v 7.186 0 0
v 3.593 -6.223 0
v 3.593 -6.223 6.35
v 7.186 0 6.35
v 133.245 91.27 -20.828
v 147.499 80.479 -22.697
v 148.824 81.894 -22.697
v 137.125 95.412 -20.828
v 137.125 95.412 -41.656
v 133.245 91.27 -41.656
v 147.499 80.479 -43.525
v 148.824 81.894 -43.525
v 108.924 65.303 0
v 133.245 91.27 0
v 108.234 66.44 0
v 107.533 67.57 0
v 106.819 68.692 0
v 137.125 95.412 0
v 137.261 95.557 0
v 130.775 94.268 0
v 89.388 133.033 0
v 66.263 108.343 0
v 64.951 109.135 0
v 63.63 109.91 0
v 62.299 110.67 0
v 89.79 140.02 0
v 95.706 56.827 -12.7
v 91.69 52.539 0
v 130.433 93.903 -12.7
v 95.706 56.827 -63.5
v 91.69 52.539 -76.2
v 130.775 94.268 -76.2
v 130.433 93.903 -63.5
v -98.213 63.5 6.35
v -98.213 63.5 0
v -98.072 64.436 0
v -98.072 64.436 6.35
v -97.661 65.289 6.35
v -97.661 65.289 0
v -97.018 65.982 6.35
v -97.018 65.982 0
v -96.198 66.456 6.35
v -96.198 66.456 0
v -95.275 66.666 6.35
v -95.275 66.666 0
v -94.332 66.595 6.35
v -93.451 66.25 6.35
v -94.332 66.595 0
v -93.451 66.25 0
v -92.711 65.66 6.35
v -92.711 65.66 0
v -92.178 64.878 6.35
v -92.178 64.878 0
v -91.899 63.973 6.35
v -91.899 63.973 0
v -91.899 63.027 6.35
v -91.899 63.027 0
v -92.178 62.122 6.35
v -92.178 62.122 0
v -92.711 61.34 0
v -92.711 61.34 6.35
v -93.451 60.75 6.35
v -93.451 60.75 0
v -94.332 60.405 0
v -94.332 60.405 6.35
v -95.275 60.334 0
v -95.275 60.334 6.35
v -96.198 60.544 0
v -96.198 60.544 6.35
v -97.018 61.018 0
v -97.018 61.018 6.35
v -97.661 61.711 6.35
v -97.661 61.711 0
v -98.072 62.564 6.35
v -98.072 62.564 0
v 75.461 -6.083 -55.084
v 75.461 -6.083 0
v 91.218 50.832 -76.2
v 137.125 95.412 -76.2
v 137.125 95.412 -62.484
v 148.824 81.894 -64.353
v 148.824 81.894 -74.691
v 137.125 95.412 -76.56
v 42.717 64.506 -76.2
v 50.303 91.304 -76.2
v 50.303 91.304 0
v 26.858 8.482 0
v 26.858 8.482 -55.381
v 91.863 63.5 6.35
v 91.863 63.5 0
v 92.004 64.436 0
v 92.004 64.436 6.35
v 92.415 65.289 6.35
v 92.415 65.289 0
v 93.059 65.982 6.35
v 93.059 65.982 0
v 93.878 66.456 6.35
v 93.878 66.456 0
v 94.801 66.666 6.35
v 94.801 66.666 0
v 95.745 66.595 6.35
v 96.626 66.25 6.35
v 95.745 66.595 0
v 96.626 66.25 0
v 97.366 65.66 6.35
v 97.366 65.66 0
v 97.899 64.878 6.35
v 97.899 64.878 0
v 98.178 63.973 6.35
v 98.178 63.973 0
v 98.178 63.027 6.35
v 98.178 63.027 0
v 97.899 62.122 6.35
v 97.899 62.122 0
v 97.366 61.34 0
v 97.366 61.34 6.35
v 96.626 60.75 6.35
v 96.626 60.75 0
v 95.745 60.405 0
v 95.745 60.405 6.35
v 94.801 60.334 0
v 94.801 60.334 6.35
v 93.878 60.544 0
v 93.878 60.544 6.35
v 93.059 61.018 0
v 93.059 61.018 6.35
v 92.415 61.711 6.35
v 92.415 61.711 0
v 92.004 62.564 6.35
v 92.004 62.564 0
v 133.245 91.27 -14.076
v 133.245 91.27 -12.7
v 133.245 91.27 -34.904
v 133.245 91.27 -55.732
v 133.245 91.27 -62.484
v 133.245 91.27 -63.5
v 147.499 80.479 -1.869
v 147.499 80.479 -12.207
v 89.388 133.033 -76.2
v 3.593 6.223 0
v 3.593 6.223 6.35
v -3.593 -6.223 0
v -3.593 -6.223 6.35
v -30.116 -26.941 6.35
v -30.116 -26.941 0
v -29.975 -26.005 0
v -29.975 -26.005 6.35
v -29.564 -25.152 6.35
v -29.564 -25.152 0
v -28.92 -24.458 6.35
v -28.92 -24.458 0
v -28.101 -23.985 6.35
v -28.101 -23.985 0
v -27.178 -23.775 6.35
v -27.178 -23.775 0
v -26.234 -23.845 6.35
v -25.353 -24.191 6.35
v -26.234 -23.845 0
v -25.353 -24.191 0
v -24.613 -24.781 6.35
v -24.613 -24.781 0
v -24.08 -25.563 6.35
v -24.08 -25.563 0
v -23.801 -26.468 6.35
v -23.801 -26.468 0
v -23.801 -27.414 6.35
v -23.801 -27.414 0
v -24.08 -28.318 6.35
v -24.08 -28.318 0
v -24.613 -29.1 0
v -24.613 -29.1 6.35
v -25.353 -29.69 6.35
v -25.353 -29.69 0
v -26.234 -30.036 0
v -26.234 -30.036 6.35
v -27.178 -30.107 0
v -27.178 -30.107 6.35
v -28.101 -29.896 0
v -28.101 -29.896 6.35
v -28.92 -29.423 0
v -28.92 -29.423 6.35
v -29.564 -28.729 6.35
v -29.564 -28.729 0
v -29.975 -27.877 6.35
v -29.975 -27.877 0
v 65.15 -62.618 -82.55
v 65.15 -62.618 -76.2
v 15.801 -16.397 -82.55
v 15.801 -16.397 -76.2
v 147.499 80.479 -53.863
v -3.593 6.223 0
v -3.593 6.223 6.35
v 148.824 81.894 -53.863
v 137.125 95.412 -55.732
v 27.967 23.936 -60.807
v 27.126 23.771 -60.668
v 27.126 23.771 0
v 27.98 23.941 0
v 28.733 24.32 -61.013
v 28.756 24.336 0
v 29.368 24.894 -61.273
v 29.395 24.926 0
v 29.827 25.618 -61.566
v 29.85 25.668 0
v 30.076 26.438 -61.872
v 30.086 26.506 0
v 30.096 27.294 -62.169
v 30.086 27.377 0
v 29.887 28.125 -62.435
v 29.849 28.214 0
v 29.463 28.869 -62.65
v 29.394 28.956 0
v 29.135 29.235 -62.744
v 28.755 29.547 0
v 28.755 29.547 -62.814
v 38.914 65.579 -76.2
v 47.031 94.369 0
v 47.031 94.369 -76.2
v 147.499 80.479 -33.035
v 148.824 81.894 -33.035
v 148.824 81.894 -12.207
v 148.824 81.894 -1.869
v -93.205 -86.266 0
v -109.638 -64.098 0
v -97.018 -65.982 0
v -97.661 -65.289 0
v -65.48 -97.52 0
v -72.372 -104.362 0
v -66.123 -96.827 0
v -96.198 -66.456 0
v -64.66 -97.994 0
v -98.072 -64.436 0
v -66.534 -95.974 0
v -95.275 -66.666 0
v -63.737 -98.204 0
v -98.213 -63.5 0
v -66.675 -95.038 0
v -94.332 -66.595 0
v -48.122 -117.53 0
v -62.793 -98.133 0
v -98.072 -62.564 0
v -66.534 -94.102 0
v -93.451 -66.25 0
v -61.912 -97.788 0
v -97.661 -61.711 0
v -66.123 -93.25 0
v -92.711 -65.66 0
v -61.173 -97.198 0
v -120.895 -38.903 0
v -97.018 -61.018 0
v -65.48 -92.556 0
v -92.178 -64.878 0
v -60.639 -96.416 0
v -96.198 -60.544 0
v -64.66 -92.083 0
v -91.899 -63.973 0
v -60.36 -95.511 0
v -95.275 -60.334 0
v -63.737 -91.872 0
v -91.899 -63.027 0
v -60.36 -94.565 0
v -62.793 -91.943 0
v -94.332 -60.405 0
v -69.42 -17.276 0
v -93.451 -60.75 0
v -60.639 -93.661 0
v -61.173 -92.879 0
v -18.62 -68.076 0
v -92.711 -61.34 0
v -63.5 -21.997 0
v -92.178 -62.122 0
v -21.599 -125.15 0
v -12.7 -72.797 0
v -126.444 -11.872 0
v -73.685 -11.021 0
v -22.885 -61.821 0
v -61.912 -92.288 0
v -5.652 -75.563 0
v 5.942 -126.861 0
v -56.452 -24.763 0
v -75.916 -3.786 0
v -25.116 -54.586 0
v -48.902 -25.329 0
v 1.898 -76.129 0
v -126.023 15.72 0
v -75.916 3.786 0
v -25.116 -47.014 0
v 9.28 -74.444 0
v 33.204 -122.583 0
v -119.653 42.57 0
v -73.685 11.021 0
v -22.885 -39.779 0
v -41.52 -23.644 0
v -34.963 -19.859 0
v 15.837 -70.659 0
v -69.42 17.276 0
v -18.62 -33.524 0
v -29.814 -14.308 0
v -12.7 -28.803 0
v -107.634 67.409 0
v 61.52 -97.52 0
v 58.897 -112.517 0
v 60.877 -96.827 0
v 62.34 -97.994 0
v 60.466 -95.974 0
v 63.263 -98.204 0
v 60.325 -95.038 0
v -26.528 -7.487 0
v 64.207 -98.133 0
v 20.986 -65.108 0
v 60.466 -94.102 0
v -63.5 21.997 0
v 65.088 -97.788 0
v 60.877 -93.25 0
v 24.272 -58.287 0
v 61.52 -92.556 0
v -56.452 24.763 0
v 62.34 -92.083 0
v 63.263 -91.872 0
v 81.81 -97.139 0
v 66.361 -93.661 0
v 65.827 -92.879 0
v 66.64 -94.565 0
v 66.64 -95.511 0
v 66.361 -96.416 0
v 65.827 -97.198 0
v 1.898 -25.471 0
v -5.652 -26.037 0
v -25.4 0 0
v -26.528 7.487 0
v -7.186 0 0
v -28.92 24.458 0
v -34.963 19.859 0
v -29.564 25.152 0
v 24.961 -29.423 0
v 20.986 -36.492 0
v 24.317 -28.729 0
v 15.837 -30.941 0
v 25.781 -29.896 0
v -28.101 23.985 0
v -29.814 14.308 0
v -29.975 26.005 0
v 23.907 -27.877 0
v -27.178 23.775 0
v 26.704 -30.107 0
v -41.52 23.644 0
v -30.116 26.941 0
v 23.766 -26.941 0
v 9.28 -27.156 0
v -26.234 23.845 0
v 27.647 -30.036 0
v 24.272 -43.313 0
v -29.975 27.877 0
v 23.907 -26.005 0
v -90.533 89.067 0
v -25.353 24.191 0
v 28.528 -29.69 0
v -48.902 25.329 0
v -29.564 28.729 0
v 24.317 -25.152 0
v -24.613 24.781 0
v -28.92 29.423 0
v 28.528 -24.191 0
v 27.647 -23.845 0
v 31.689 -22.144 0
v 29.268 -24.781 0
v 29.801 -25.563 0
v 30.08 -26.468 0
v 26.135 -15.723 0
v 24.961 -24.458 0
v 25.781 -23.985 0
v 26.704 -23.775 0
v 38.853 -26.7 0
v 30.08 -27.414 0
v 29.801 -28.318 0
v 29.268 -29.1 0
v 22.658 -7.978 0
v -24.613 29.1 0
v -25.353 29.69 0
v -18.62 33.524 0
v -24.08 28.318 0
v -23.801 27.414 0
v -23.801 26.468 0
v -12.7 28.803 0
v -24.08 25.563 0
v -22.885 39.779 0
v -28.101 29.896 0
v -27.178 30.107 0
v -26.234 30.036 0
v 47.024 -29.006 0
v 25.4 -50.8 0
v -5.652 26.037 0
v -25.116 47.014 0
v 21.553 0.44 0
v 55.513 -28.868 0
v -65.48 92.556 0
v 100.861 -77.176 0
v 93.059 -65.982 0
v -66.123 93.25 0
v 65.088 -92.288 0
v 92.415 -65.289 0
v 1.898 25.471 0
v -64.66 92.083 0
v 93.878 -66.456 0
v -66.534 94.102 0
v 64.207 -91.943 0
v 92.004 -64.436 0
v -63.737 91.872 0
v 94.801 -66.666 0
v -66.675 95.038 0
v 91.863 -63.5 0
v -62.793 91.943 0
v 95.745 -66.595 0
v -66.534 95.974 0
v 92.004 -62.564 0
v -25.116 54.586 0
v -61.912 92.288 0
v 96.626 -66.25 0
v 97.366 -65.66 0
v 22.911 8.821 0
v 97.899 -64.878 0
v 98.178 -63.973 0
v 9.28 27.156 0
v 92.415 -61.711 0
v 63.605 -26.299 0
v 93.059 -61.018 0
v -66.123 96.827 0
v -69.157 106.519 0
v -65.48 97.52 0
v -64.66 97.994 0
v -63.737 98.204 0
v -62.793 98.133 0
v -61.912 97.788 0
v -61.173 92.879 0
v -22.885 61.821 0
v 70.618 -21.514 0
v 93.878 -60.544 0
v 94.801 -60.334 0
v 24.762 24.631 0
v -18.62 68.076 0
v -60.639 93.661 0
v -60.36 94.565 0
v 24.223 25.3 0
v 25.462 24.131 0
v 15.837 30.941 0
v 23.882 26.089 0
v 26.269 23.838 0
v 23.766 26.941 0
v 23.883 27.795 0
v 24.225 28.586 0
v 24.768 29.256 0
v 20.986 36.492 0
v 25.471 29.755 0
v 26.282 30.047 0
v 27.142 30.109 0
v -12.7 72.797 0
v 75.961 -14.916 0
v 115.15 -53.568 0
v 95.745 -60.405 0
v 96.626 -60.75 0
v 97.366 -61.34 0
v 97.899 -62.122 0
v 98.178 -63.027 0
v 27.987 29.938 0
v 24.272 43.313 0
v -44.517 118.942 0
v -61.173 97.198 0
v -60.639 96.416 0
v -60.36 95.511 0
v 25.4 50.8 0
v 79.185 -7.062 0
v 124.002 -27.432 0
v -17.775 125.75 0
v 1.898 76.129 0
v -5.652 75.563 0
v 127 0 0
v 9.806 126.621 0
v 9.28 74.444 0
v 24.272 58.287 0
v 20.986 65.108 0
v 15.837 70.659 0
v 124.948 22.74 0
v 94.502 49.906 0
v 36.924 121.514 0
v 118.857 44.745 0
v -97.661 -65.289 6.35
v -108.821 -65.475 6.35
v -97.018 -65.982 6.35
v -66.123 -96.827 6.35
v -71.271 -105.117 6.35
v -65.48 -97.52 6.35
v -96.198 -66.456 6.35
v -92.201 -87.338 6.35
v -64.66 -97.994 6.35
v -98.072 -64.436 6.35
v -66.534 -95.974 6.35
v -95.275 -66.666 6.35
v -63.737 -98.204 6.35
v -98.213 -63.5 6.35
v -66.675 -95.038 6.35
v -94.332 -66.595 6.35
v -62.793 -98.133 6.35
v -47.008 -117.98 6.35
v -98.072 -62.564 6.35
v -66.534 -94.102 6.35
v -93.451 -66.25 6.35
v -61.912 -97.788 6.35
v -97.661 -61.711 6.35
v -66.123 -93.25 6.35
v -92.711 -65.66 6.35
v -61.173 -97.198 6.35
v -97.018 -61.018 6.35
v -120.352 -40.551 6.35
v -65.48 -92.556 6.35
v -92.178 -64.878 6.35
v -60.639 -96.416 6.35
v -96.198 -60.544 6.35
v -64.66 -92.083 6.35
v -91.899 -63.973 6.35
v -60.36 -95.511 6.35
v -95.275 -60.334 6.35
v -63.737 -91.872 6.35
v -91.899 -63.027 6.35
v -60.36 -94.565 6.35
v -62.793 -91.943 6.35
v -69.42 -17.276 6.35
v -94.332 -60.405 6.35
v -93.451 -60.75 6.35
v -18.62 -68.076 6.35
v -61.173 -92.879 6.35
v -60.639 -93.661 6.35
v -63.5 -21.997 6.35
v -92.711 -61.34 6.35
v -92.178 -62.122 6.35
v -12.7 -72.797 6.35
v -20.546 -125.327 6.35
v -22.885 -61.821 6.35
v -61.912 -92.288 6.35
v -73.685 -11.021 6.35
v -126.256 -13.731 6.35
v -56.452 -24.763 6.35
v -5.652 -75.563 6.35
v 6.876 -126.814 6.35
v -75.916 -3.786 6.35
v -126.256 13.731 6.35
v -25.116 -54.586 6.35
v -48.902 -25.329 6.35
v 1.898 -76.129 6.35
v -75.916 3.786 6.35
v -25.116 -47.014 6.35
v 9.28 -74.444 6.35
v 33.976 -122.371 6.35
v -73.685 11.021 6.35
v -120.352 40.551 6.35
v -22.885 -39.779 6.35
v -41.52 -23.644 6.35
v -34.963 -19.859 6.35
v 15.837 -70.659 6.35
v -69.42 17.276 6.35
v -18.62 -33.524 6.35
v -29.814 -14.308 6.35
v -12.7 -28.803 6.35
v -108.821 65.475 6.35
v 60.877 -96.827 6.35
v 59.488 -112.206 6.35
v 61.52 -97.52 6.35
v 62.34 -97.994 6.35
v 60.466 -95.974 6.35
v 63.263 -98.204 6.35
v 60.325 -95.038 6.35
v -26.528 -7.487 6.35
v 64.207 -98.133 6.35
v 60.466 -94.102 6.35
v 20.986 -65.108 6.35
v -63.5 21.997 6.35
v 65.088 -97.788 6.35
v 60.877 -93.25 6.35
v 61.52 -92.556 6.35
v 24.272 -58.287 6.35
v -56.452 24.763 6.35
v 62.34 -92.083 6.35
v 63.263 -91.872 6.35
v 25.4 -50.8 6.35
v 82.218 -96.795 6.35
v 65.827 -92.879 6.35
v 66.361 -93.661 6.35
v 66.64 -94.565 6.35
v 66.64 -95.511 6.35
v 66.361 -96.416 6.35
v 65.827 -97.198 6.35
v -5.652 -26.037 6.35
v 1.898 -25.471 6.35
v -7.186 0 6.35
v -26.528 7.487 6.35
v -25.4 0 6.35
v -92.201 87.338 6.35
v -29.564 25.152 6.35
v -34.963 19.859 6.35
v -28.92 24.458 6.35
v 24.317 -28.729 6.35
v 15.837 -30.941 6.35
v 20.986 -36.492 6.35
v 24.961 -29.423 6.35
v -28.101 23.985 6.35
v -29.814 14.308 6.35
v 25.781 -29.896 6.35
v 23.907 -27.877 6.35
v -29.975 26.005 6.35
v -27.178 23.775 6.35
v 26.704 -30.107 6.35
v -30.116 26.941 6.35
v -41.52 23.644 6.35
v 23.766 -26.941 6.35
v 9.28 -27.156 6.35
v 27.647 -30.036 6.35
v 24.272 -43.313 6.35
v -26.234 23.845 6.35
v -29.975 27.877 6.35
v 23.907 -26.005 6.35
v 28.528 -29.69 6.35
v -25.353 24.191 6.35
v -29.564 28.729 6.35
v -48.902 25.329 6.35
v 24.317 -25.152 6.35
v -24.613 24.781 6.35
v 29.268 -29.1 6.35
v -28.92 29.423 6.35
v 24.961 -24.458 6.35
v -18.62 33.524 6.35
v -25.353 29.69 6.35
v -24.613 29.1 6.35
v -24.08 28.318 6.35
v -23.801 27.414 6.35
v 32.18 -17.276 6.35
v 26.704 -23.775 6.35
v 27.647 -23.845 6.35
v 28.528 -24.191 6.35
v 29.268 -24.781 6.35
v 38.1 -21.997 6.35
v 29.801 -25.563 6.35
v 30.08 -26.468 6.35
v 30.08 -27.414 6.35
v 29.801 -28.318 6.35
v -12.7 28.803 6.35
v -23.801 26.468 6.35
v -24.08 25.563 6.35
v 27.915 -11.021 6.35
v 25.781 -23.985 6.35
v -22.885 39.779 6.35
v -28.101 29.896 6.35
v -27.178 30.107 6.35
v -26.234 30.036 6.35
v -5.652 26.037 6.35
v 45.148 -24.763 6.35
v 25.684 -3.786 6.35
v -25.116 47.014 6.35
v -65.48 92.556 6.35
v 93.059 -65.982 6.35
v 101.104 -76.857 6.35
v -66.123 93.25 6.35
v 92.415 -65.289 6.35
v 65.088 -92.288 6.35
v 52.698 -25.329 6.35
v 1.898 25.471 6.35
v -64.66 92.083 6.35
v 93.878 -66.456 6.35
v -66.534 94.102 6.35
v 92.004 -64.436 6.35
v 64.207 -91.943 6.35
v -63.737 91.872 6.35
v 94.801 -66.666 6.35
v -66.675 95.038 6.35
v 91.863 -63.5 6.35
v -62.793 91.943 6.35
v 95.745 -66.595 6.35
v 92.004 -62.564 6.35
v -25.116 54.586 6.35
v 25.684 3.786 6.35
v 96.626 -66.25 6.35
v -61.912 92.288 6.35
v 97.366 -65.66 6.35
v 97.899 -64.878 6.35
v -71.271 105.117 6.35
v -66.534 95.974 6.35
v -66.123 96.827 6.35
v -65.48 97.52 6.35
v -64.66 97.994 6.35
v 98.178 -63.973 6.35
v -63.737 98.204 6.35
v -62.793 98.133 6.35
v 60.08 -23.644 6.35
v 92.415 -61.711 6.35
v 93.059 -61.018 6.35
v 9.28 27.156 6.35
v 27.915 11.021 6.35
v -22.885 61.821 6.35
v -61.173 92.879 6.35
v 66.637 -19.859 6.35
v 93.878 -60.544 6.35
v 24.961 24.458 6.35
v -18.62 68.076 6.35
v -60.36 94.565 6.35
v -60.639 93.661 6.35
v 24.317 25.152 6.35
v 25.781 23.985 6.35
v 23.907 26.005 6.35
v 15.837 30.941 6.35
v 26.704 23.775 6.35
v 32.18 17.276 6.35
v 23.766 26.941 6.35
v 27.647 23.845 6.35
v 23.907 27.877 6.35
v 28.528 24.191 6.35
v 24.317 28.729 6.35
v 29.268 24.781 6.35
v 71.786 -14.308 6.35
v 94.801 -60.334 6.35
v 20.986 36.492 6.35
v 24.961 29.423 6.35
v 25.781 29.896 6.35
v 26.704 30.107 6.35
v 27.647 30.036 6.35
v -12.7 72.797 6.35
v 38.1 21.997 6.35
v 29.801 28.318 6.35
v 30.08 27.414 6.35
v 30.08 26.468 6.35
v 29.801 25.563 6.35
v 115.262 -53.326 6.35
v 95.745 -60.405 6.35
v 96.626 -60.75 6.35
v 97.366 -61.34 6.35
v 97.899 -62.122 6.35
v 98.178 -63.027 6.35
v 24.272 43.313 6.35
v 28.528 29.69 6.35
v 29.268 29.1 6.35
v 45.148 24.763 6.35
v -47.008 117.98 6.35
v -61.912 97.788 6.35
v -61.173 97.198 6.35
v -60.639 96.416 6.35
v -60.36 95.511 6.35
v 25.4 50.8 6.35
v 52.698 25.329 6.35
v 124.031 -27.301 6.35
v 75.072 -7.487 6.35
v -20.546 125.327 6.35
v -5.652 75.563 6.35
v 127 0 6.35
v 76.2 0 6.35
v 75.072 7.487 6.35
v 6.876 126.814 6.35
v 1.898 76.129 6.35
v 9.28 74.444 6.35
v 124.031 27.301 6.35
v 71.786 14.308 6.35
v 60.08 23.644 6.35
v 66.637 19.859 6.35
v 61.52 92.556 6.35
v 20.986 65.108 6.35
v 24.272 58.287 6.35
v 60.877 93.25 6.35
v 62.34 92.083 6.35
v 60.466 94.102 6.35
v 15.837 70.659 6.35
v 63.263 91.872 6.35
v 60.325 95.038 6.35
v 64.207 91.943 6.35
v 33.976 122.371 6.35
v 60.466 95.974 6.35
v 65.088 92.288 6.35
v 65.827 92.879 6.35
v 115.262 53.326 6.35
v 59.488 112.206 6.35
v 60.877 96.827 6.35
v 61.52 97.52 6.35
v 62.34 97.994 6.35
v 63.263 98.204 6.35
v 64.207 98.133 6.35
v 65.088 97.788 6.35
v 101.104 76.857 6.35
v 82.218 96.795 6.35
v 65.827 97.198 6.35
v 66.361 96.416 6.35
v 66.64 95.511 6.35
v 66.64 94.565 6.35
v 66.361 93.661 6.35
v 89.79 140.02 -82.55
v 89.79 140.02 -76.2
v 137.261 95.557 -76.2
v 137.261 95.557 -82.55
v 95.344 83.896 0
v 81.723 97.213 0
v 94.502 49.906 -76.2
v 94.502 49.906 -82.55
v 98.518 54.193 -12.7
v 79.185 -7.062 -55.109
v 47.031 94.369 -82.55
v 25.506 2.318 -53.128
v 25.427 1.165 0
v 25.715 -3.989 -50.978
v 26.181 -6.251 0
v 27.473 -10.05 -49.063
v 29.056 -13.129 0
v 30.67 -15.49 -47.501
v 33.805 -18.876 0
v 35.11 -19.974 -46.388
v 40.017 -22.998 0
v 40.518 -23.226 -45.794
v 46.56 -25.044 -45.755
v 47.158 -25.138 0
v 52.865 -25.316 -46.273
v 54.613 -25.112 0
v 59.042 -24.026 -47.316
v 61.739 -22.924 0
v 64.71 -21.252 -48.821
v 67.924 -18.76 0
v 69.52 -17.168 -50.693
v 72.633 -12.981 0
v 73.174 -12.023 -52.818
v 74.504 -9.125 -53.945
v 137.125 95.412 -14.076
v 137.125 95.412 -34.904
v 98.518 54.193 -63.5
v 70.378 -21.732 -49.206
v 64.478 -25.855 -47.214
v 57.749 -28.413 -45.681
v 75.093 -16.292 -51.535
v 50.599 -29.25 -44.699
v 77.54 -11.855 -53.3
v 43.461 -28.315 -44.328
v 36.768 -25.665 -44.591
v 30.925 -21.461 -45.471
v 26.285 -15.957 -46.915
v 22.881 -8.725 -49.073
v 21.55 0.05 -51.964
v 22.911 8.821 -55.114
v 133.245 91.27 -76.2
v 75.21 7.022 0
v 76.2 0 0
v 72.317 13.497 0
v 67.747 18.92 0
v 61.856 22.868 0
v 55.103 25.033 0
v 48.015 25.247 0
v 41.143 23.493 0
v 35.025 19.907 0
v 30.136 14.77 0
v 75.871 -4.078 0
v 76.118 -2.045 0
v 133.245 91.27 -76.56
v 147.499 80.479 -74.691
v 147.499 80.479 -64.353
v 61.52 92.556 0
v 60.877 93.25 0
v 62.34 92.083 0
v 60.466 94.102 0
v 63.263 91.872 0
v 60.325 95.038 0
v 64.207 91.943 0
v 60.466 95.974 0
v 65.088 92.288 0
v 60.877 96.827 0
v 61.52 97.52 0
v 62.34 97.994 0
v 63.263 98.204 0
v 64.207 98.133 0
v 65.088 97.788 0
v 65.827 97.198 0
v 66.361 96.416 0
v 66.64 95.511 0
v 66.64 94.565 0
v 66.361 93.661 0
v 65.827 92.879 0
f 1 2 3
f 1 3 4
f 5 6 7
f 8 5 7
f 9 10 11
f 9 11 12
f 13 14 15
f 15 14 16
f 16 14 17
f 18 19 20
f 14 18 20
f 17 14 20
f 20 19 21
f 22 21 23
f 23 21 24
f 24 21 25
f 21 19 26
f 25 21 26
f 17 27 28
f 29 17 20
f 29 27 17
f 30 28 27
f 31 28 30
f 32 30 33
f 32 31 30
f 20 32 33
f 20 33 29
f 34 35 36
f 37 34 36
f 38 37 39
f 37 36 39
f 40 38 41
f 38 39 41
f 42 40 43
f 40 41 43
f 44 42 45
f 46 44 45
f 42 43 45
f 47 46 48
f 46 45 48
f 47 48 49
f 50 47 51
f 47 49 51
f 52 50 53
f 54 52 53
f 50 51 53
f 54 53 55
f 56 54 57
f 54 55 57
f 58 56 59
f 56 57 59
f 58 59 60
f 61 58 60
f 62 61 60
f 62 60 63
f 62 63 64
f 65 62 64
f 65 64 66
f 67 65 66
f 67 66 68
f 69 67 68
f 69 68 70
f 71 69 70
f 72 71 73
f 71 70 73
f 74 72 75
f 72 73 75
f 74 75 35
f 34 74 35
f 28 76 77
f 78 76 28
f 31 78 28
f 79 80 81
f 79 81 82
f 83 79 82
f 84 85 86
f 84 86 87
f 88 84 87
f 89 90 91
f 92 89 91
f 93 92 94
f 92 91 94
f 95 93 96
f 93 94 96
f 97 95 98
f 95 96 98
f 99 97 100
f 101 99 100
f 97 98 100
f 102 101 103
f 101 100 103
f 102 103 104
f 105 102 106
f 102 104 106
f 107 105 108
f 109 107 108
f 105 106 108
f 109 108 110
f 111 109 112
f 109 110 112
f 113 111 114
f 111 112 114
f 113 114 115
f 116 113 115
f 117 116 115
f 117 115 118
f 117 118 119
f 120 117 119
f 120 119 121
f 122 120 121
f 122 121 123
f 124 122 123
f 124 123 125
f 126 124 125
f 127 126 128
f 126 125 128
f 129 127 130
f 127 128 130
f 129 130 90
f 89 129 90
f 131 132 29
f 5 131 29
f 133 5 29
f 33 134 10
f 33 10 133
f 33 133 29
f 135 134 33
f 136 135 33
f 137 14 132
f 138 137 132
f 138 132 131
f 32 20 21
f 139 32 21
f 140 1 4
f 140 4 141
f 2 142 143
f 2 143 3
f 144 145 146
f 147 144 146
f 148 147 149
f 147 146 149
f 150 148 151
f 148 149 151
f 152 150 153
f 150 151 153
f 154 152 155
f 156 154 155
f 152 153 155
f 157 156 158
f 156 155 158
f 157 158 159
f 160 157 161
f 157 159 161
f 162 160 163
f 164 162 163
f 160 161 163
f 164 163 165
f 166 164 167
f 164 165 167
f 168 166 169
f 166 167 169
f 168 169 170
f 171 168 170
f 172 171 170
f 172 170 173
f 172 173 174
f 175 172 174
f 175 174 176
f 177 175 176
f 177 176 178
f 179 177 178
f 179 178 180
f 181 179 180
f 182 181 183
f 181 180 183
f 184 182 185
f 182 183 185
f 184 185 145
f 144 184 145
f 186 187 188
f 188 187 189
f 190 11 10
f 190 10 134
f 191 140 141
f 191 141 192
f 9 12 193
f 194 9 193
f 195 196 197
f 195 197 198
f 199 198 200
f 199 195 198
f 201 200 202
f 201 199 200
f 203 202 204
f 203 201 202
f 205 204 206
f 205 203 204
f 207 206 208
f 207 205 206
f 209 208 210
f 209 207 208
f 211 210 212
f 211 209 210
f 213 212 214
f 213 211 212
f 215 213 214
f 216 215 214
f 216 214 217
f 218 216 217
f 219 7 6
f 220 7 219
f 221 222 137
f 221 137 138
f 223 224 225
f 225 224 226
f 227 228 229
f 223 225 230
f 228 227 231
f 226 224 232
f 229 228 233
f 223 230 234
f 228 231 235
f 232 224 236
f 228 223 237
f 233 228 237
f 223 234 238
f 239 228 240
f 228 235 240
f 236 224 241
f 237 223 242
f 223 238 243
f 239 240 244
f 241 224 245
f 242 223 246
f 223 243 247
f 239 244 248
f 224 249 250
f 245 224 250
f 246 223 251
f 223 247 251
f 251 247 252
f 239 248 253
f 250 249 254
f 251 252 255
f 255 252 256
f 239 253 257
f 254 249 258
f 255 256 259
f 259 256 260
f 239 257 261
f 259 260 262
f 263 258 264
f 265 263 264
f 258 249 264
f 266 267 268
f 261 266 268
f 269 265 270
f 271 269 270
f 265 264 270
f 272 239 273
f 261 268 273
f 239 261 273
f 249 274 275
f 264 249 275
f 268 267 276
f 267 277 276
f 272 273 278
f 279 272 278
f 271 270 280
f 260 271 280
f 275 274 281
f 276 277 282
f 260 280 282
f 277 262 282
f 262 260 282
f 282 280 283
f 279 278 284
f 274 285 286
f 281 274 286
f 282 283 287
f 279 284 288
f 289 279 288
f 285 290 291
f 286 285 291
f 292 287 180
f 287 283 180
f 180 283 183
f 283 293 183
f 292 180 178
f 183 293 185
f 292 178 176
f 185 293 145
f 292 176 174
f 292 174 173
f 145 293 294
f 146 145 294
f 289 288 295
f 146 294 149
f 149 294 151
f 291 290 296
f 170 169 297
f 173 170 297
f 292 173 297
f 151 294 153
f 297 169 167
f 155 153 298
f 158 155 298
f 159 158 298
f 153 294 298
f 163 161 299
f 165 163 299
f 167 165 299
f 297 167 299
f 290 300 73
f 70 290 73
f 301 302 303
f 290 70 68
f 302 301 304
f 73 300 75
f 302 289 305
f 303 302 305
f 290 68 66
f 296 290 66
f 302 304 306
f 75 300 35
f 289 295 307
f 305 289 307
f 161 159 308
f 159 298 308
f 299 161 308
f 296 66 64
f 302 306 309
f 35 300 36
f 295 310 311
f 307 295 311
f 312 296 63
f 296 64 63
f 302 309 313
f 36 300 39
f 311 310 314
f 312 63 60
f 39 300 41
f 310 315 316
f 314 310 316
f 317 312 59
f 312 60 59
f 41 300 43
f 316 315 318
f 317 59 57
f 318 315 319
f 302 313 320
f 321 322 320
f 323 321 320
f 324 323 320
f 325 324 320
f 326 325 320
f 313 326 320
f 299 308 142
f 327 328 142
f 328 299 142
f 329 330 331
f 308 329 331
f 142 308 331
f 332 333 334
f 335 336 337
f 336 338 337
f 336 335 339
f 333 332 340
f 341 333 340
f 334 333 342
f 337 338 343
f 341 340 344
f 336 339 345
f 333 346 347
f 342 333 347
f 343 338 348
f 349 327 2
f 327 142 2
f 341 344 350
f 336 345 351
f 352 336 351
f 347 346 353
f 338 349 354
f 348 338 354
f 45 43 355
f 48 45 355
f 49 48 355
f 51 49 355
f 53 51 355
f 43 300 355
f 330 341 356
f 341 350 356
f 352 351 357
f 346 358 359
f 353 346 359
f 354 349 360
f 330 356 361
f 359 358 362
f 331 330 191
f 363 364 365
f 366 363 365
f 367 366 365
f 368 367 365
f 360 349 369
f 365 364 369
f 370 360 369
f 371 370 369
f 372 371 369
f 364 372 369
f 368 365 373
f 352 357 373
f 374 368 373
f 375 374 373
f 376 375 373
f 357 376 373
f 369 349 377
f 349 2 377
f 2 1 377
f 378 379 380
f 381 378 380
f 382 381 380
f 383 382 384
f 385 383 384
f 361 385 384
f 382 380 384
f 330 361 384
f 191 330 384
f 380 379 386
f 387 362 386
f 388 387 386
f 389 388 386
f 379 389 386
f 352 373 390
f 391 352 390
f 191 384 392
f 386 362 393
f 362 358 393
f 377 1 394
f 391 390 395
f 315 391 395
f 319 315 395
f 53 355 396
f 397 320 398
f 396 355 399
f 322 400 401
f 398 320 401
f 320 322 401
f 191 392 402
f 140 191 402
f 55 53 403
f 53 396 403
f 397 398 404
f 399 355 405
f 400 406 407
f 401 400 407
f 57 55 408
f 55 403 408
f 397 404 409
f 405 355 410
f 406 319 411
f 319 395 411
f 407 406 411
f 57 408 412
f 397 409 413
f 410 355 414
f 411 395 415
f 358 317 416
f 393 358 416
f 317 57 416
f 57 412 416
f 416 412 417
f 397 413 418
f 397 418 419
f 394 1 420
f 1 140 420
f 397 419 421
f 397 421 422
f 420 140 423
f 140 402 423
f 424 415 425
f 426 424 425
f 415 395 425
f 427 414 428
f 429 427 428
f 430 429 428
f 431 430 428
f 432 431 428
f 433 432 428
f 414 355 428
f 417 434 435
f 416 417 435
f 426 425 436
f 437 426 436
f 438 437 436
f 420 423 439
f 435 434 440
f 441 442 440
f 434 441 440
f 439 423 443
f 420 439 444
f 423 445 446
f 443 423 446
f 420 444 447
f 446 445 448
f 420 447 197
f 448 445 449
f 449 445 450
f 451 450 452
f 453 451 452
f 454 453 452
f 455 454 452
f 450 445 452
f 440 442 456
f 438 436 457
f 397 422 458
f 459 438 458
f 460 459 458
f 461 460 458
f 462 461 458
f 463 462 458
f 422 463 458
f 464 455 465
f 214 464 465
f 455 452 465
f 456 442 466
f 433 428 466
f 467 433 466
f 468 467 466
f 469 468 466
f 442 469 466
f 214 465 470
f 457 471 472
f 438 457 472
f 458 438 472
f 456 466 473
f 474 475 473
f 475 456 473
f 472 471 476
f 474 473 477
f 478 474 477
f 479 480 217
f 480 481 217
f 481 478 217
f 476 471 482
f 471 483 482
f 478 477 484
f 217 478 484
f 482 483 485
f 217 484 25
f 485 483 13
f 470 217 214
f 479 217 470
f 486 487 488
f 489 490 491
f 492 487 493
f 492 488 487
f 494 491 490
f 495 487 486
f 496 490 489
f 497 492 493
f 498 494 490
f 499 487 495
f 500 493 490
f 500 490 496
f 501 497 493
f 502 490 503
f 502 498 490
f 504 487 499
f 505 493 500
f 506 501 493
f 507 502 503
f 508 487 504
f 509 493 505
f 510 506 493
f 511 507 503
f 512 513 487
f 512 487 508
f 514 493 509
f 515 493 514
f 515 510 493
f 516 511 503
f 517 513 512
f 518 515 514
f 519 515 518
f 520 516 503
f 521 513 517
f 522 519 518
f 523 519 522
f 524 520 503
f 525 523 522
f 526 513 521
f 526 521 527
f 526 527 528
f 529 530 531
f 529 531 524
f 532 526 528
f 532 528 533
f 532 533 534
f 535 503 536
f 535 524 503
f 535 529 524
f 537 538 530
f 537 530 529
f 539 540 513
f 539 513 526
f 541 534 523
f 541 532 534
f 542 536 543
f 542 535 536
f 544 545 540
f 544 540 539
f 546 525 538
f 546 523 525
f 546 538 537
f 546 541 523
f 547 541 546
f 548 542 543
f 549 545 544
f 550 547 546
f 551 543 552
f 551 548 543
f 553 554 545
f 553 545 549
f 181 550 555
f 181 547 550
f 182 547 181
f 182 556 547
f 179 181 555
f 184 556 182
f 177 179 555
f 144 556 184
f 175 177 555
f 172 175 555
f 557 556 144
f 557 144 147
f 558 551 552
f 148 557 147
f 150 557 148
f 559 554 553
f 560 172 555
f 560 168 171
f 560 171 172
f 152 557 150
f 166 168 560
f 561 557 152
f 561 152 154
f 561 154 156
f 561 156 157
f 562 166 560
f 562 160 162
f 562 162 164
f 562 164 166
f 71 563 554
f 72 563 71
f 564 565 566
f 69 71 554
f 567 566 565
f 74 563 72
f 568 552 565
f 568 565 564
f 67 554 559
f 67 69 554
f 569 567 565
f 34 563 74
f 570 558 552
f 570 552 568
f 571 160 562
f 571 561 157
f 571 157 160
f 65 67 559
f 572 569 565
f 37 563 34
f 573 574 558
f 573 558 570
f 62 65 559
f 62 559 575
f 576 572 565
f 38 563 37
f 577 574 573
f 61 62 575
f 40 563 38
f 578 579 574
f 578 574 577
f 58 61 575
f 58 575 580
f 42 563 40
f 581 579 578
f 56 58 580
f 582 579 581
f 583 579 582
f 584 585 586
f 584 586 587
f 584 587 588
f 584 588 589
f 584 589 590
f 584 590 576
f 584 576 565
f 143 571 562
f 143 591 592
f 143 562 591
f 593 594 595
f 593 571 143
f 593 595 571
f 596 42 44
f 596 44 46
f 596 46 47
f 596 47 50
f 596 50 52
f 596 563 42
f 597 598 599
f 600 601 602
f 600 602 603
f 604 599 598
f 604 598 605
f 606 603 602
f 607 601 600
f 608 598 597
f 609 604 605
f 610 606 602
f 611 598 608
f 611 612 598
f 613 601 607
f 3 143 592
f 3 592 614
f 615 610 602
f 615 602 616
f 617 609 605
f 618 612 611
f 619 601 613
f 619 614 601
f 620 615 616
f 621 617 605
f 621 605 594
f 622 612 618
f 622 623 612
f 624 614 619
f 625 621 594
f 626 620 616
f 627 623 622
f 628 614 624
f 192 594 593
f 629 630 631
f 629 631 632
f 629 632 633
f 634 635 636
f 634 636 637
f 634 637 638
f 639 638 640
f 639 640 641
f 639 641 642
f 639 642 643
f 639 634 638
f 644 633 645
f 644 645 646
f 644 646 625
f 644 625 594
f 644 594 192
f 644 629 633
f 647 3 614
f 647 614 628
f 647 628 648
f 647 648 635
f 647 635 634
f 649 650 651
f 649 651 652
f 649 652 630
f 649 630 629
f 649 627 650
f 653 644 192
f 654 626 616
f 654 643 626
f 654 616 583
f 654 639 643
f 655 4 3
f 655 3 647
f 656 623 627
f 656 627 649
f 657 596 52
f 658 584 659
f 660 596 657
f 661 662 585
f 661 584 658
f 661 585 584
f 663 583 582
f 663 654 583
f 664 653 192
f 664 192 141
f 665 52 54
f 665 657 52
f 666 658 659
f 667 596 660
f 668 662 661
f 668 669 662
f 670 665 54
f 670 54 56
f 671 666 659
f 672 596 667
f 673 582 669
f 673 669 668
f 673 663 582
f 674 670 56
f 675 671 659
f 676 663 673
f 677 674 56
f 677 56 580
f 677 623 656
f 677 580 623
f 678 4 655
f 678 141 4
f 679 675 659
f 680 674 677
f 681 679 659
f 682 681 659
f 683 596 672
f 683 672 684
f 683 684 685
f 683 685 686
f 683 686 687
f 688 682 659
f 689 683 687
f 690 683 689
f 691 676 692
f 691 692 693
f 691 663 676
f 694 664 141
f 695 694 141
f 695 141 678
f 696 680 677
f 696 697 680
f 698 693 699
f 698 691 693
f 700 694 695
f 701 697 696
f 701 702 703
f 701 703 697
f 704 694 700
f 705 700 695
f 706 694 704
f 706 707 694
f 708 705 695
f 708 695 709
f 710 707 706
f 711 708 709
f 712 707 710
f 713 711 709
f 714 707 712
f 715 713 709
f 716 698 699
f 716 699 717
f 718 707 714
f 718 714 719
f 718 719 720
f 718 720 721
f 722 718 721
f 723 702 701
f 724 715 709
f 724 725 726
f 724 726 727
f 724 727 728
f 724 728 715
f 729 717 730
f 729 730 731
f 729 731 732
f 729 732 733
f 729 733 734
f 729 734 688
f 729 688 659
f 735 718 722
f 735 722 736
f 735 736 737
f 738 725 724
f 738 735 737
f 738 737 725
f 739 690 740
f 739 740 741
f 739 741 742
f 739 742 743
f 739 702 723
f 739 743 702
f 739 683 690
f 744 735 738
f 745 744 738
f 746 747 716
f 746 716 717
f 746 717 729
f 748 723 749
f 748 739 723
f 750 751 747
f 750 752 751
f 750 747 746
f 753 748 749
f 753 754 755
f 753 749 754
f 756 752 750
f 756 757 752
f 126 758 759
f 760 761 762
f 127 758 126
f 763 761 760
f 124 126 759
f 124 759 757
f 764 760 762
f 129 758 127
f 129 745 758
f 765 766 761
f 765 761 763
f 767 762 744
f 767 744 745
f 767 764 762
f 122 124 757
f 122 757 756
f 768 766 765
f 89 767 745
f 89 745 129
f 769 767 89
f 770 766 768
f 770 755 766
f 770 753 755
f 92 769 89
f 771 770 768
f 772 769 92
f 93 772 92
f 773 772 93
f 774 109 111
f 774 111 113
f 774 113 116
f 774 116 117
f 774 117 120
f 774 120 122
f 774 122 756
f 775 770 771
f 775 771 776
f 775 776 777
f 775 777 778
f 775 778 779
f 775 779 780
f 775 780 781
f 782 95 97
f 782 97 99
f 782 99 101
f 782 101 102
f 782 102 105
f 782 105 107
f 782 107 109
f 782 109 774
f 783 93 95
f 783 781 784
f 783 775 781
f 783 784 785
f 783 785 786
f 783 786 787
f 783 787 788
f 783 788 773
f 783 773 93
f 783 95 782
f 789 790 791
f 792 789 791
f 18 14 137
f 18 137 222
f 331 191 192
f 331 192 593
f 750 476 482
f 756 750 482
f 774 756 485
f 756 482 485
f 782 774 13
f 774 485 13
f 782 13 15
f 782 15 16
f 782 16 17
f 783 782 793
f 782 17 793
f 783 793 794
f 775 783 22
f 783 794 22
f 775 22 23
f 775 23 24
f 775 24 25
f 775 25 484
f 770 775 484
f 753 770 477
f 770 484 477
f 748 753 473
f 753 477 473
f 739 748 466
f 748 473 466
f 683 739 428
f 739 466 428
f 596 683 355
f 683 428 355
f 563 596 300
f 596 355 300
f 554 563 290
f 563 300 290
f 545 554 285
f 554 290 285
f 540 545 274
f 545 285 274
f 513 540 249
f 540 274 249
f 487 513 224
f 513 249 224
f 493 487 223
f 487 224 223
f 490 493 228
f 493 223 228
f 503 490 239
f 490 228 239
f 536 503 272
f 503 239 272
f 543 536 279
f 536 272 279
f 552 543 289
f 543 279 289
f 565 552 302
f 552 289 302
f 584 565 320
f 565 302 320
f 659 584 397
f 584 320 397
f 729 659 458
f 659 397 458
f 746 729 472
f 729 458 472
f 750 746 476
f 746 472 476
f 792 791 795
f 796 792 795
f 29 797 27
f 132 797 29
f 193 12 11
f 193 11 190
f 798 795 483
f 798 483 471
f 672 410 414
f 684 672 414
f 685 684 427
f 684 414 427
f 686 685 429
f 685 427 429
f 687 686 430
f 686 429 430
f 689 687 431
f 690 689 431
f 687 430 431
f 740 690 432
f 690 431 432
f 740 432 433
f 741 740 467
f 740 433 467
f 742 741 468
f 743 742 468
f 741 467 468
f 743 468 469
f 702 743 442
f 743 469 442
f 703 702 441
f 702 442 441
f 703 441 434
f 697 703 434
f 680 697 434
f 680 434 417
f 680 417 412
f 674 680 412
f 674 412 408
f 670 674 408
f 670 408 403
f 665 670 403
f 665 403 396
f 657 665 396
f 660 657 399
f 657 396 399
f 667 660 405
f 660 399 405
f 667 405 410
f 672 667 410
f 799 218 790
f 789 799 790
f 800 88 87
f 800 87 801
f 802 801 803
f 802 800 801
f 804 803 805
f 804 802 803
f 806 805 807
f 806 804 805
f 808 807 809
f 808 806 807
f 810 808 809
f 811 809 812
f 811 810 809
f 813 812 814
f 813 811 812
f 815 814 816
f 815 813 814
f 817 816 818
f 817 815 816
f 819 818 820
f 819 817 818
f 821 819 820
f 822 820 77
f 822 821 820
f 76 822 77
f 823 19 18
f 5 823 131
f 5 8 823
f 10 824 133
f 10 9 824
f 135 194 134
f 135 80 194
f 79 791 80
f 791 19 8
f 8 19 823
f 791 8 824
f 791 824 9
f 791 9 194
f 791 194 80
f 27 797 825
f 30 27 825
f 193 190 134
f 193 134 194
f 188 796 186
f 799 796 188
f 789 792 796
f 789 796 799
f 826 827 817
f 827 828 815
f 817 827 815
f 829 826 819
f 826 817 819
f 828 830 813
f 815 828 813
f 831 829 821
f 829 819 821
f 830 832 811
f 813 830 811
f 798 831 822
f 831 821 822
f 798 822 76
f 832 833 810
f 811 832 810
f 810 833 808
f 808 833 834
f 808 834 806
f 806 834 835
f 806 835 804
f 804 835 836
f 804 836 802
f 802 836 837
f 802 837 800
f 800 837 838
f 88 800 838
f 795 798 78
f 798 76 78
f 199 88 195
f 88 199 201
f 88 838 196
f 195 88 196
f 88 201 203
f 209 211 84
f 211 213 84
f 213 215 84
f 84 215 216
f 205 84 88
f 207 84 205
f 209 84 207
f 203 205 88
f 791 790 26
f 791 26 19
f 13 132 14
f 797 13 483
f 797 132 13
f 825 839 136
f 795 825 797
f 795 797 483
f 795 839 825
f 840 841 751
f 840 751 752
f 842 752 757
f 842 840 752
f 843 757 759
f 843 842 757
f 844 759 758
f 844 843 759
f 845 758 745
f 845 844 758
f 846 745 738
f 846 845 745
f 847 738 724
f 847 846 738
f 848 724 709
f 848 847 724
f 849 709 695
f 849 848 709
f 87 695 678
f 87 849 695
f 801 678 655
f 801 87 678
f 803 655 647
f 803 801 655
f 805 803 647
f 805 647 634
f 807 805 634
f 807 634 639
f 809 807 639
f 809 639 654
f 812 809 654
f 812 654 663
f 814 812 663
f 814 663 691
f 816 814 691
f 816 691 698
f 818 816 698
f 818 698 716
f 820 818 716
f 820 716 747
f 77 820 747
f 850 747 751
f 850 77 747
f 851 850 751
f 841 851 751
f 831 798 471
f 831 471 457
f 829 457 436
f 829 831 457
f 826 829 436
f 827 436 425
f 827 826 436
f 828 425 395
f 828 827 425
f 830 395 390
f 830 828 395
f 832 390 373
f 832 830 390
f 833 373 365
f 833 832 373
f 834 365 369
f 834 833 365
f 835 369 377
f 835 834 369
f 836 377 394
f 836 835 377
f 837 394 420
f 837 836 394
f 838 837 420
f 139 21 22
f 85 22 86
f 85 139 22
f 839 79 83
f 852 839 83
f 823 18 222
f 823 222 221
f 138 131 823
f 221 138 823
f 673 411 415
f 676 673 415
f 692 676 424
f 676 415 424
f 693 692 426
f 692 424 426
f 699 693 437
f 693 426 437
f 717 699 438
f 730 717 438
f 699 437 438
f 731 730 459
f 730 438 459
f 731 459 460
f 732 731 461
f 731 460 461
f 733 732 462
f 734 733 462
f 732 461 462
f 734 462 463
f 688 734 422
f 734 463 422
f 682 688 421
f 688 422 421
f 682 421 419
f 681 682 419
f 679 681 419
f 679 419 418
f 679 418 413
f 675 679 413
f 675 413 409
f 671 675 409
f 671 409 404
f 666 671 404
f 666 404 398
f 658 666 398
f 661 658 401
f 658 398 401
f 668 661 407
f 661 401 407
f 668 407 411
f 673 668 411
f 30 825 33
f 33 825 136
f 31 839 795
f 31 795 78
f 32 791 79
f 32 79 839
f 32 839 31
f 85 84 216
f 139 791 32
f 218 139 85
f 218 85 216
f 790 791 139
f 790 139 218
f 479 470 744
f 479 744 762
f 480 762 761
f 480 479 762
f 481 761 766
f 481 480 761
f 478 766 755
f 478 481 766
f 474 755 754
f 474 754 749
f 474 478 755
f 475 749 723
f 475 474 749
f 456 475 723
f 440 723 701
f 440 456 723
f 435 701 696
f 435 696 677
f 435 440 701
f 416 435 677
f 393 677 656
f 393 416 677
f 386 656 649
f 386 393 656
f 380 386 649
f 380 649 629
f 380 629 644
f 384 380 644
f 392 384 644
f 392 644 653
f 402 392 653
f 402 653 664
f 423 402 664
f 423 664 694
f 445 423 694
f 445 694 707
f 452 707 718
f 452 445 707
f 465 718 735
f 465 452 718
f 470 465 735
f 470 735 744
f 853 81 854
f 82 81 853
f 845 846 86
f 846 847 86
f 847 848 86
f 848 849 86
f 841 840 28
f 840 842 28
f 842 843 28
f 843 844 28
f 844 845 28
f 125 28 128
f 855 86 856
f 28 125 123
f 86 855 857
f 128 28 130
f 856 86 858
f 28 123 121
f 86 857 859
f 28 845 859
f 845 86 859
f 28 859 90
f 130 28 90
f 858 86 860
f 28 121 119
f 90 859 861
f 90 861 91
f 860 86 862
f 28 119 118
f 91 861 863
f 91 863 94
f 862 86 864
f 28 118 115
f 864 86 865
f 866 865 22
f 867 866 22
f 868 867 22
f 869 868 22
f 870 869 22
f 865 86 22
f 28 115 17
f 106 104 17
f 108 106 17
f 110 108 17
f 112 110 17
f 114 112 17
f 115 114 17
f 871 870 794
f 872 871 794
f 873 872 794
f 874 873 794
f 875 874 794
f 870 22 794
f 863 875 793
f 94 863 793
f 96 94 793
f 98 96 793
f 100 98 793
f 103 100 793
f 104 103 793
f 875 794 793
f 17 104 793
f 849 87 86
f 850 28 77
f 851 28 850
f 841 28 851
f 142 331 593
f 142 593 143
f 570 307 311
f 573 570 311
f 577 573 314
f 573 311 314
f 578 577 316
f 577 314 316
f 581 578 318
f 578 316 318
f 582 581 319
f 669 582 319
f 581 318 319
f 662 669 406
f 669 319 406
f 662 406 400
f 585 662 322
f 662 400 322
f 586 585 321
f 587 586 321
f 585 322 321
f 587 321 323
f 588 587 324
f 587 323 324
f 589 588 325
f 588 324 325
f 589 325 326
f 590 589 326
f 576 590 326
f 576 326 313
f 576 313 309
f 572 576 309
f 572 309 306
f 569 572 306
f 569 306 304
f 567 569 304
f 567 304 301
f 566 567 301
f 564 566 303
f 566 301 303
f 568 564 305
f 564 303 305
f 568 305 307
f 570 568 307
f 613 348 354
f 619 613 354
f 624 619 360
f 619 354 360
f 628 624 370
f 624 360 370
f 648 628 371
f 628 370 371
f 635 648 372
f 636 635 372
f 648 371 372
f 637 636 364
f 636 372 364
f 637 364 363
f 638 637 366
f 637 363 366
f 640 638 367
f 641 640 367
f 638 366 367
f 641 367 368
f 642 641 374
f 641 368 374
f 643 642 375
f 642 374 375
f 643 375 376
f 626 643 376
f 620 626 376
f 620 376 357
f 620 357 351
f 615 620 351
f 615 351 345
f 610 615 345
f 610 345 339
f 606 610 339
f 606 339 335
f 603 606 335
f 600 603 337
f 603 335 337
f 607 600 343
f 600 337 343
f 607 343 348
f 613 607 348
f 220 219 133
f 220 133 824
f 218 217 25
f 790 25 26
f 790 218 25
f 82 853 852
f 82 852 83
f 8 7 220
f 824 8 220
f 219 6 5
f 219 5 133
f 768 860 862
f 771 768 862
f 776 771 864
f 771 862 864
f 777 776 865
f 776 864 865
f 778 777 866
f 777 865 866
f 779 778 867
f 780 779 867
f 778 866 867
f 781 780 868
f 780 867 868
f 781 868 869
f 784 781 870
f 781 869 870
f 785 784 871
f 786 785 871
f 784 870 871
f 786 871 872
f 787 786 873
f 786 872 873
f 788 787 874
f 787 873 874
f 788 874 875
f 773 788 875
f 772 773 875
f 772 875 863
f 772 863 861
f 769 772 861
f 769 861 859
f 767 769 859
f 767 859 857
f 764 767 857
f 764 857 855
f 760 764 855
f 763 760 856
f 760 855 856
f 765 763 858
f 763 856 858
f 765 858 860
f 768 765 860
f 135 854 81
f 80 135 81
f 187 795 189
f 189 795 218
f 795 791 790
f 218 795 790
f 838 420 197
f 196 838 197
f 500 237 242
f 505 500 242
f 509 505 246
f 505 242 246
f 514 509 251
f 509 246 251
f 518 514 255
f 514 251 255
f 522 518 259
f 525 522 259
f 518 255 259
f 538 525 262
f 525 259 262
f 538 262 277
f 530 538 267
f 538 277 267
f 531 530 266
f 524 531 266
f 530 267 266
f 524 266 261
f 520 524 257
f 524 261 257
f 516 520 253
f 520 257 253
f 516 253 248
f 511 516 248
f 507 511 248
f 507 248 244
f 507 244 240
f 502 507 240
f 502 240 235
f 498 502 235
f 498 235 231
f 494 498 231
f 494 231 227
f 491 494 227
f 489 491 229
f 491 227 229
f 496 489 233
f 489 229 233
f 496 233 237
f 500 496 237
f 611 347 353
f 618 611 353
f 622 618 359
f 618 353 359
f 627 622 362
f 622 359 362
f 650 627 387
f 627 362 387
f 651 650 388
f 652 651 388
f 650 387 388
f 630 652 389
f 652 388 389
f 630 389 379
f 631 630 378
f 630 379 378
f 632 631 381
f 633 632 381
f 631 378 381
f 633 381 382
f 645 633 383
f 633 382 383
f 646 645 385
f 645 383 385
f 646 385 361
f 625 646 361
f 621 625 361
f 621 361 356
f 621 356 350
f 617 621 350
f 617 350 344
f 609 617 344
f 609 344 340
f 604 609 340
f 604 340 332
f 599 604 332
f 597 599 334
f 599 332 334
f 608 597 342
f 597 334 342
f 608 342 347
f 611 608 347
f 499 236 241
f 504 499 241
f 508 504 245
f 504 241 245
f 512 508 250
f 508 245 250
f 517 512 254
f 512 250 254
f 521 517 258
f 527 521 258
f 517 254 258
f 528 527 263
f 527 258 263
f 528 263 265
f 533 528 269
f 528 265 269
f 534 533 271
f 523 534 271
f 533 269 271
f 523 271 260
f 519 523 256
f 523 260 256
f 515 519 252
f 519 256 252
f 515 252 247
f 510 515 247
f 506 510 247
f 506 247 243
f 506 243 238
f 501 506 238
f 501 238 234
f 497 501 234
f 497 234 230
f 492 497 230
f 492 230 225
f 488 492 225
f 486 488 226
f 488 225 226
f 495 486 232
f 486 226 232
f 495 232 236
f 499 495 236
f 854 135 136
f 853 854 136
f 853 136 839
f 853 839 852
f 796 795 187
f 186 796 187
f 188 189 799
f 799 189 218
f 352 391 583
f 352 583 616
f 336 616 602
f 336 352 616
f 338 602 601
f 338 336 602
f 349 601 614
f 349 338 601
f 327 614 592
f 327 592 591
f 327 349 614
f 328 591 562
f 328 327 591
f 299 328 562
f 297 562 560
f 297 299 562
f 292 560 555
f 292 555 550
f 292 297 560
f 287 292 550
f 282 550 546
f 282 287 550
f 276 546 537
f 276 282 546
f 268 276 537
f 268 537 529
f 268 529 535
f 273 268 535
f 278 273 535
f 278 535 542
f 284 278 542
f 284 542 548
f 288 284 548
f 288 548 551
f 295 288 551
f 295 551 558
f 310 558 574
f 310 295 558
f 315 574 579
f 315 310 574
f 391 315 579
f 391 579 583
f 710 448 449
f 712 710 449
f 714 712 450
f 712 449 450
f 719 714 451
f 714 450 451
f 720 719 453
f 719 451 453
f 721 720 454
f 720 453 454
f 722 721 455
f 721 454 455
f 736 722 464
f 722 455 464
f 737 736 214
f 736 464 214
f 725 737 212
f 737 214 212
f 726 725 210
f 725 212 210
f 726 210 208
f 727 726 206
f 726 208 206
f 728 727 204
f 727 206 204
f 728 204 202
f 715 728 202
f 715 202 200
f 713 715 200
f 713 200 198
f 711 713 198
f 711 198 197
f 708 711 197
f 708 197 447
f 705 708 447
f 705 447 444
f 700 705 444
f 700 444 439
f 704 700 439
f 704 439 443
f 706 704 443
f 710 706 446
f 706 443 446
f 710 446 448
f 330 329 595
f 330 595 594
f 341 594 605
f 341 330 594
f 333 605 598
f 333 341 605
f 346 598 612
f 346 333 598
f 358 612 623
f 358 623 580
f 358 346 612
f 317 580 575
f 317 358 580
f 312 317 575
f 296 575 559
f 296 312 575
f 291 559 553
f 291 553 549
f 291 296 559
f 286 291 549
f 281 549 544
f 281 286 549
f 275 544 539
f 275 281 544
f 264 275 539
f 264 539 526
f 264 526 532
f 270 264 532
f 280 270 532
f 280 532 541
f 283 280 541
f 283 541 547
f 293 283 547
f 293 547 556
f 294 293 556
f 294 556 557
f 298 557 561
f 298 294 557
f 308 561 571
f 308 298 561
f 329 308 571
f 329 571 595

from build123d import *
from build123d.topology import SkipClean

# Parameters (mm, degrees)
SKETCH1_R                     = 127
SKETCH1_R_2                   = 25.4
BOSS_EXTRUDE1_DEPTH           = 6.35
SKETCH3_R                     = 3.175
CUT_EXTRUDE1_DEPTH            = 6.35
BOSS_EXTRUDE3_START           = 76.2
BOSS_EXTRUDE3_DEPTH           = 76.2
SKETCH8_W                     = 50.8
SKETCH8_H                     = 50.8
CUT_EXTRUDE2_DEPTH            = 6.35
BOSS_EXTRUDE4_DEPTH           = 6.35
SKETCH12_W                    = 14.076199653
SKETCH12_H                    = 5.676094201
BOSS_EXTRUDE5_DEPTH           = 17.78
BOSS_EXTRUDE5_DRAFT           = 6
BOSS_EXTRUDE5_PROFILE_2_DEPTH = 17.78
BOSS_EXTRUDE5_PROFILE_2_DRAFT = 6
BOSS_EXTRUDE5_PROFILE_3_DEPTH = 17.78
BOSS_EXTRUDE5_PROFILE_3_DRAFT = 6
BOSS_EXTRUDE5_PROFILE_4_DEPTH = 17.78
BOSS_EXTRUDE5_PROFILE_4_DRAFT = 6
SKETCH16_W                    = 137.632835606
SKETCH16_H                    = 86.689422116
CUT_EXTRUDE4_DEPTH            = 38.1


with BuildPart() as part:
    # Sketch1 → Boss-Extrude1 (new body)
    with BuildSketch(Plane.XY):
        Circle(SKETCH1_R)
        with Locations((0, 50.8)):
            Circle(SKETCH1_R_2, mode=Mode.SUBTRACT)
        with Locations((50.8, 0)):
            Circle(SKETCH1_R_2, mode=Mode.SUBTRACT)
        with Locations((0, -50.8)):
            Circle(SKETCH1_R_2, mode=Mode.SUBTRACT)
        with Locations((-50.8, 0)):
            Circle(SKETCH1_R_2, mode=Mode.SUBTRACT)
        Polygon((7.18570145, 0), (3.592850725, 6.223), (-3.592850725, 6.223), (-7.18570145, 0), (-3.592850725, -6.223), (3.592850725, -6.223), align=None, mode=Mode.SUBTRACT)
    extrude(amount=BOSS_EXTRUDE1_DEPTH)

    # Sketch3 → Cut-Extrude1 (cut)
    with BuildSketch(Plane(origin=(0, 0, 0), x_dir=(-1, 0, 0), z_dir=(0, 0, -1))):
        with Locations((-26.940768363, 26.940768363)):
            Circle(SKETCH3_R)
        with Locations((26.940768363, 26.940768363)):
            Circle(SKETCH3_R)
        with Locations((26.940768363, -26.940768363)):
            Circle(SKETCH3_R)
        with Locations((-26.940768363, -26.940768363)):
            Circle(SKETCH3_R)
        with Locations((-63.5, 95.038097624)):
            Circle(SKETCH3_R)
        with Locations((63.5, 95.038097624)):
            Circle(SKETCH3_R)
        with Locations((95.038097624, 63.5)):
            Circle(SKETCH3_R)
        with Locations((95.038097624, -63.5)):
            Circle(SKETCH3_R)
        with Locations((63.5, -95.038097624)):
            Circle(SKETCH3_R)
        with Locations((-63.5, -95.038097624)):
            Circle(SKETCH3_R)
        with Locations((-95.038097624, -63.5)):
            Circle(SKETCH3_R)
        with Locations((-95.038097624, 63.5)):
            Circle(SKETCH3_R)
    extrude(amount=-CUT_EXTRUDE1_DEPTH, mode=Mode.SUBTRACT)

    # Sketch4 → Boss-Extrude3 (add)
    with SkipClean():  # the faces are left unmerged after this step: merging them gives an invalid solid
        with BuildSketch(Plane(origin=(0, 0, 0), x_dir=(-1, 0, 0), z_dir=(0, 0, -1)).offset(BOSS_EXTRUDE3_START)):
            with BuildLine():
                ThreePointArc((-79.185130885, -7.062226276), (-42.854710858, -28.150720697), (-22.911154448, 8.82060027))
                Line((-22.911154448, 8.82060027), (-27.126431814, 23.771201503))
                ThreePointArc((-27.126431814, 23.771201503), (-29.996629318, 26.079177494), (-28.75477002, 29.546535619))
                Line((-28.75477002, 29.546535619), (-47.031154579, 94.368589733))
                Line((-47.031154579, 94.368589733), (-89.78967593, 140.019925662))
                Line((-89.78967593, 140.019925662), (-137.260674726, 95.557049073))
                Line((-137.260674726, 95.557049073), (-94.502153375, 49.905713144))
                Line((-94.502153375, 49.905713144), (-79.185130885, -7.062226276))
            make_face()
            with BuildLine():
                Line((-91.690310224, 52.539376605), (-130.775049183, 94.268381527))
                Line((-130.775049183, 94.268381527), (-89.388084982, 133.032754057))
                Line((-89.388084982, 133.032754057), (-50.303346023, 91.303749135))
                Line((-50.303346023, 91.303749135), (-26.857967073, 8.48168965))
                ThreePointArc((-26.857967073, 8.48168965), (-43.508670742, -24.330978559), (-75.460781141, -6.083245311))
                Line((-75.460781141, -6.083245311), (-91.690310224, 52.539376605))
            make_face(mode=Mode.SUBTRACT)
        extrude(amount=-BOSS_EXTRUDE3_DEPTH)

    # Sketch8 → Cut-Extrude2 (cut)
    with SkipClean():  # the faces are left unmerged after this step: merging them gives an invalid solid
        with BuildSketch(Plane(origin=(25.440444099, -23.82834478, 0), x_dir=(0, 0, -1), z_dir=(0.729853070223302, -0.683604049055899, 0))):
            with Locations((38.1, 132.300225659)):
                Rectangle(SKETCH8_W, SKETCH8_H)
        extrude(amount=-CUT_EXTRUDE2_DEPTH, mode=Mode.SUBTRACT)


with BuildPart() as body_2:
    # Sketch6 → Boss-Extrude4 (new body)
    with BuildSketch(Plane(origin=(0, 0, -76.2), x_dir=(-1, 0, 0), z_dir=(0, 0, -1))):
        Polygon((-15.801225201, -16.396653006), (-47.031154579, 94.368589733), (-89.78967593, 140.019925662), (-137.260674726, 95.557049073), (-94.502153375, 49.905713144), (-65.150179146, -62.618483276), align=None)
    extrude(amount=BOSS_EXTRUDE4_DEPTH)


with BuildPart() as boss_extrude5_tool:
    # Sketch12 → Boss-Extrude5 (with draft: the straight prism first)
    with BuildSketch(Plane(origin=(25.440444099, -23.82834478, 0), x_dir=(0, 0, -1), z_dir=(0.7298530702233252, -0.6836040490558741, 0))):
        with Locations((7.038099827, 160.53827276)):
            Rectangle(SKETCH12_W, SKETCH12_H)
    extrude(amount=BOSS_EXTRUDE5_DEPTH)
    # Boss-Extrude5: the draft: its side faces are tilted about the plane it starts from
    boss_extrude5_sides = [boss_extrude5_tool.faces().sort_by_distance(p)[0] for p in [
        (141.67345118, 87.263766485, 0),
        (139.733350691, 85.192409096, -7.038099826),
        (141.67345118, 87.263766485, -14.076199653),
        (143.613551669, 89.335123875, -7.038099826),
    ]]
    draft(boss_extrude5_sides, Plane(origin=(25.440444099, -23.82834478, 0), x_dir=(0, 0, -1), z_dir=(0.7298530702233252, -0.6836040490558741, 0)), BOSS_EXTRUDE5_DRAFT)


with BuildPart() as part_1:
    add(part.part)

    # Boss-Extrude5: add boss_extrude5_tool
    add(boss_extrude5_tool.part)


with BuildPart() as boss_extrude5_profile_2_tool:
    # Sketch12 → Boss-Extrude5 profile 2 (with draft: the straight prism first)
    with BuildSketch(Plane(origin=(25.440444099, -23.82834478, 0), x_dir=(0, 0, -1), z_dir=(0.7298530702233252, -0.6836040490558741, 0))):
        with Locations((27.866099827, 160.53827276)):
            Rectangle(SKETCH12_W, SKETCH12_H)
    extrude(amount=BOSS_EXTRUDE5_PROFILE_2_DEPTH)
    # Boss-Extrude5 profile 2: the draft: its side faces are tilted about the plane it starts from
    boss_extrude5_profile_2_sides = [boss_extrude5_profile_2_tool.faces().sort_by_distance(p)[0] for p in [
        (141.67345118, 87.263766485, -20.828),
        (139.733350691, 85.192409096, -27.866099826),
        (141.67345118, 87.263766485, -34.904199653),
        (143.613551669, 89.335123875, -27.866099826),
    ]]
    draft(boss_extrude5_profile_2_sides, Plane(origin=(25.440444099, -23.82834478, 0), x_dir=(0, 0, -1), z_dir=(0.7298530702233252, -0.6836040490558741, 0)), BOSS_EXTRUDE5_PROFILE_2_DRAFT)


with BuildPart() as part_2:
    add(part_1.part)

    # Boss-Extrude5 profile 2: add boss_extrude5_profile_2_tool
    add(boss_extrude5_profile_2_tool.part)


with BuildPart() as boss_extrude5_profile_3_tool:
    # Sketch12 → Boss-Extrude5 profile 3 (with draft: the straight prism first)
    with BuildSketch(Plane(origin=(25.440444099, -23.82834478, 0), x_dir=(0, 0, -1), z_dir=(0.7298530702233252, -0.6836040490558741, 0))):
        with Locations((48.694099827, 160.53827276)):
            Rectangle(SKETCH12_W, SKETCH12_H)
    extrude(amount=BOSS_EXTRUDE5_PROFILE_3_DEPTH)
    # Boss-Extrude5 profile 3: the draft: its side faces are tilted about the plane it starts from
    boss_extrude5_profile_3_sides = [boss_extrude5_profile_3_tool.faces().sort_by_distance(p)[0] for p in [
        (141.67345118, 87.263766485, -41.656),
        (139.733350691, 85.192409096, -48.694099826),
        (141.67345118, 87.263766485, -55.732199653),
        (143.613551669, 89.335123875, -48.694099826),
    ]]
    draft(boss_extrude5_profile_3_sides, Plane(origin=(25.440444099, -23.82834478, 0), x_dir=(0, 0, -1), z_dir=(0.7298530702233252, -0.6836040490558741, 0)), BOSS_EXTRUDE5_PROFILE_3_DRAFT)


with BuildPart() as part_3:
    add(part_2.part)

    # Boss-Extrude5 profile 3: add boss_extrude5_profile_3_tool
    add(boss_extrude5_profile_3_tool.part)


with BuildPart() as boss_extrude5_profile_4_tool:
    # Sketch12 → Boss-Extrude5 profile 4 (with draft: the straight prism first)
    with BuildSketch(Plane(origin=(25.440444099, -23.82834478, 0), x_dir=(0, 0, -1), z_dir=(0.7298530702233252, -0.6836040490558741, 0))):
        with Locations((69.522099826, 160.53827276)):
            Rectangle(SKETCH12_W, SKETCH12_H)
    extrude(amount=BOSS_EXTRUDE5_PROFILE_4_DEPTH)
    # Boss-Extrude5 profile 4: the draft: its side faces are tilted about the plane it starts from
    boss_extrude5_profile_4_sides = [boss_extrude5_profile_4_tool.faces().sort_by_distance(p)[0] for p in [
        (141.67345118, 87.263766485, -62.484),
        (139.733350691, 85.192409096, -69.522099826),
        (141.67345118, 87.263766485, -76.560199653),
        (143.613551669, 89.335123875, -69.522099826),
    ]]
    draft(boss_extrude5_profile_4_sides, Plane(origin=(25.440444099, -23.82834478, 0), x_dir=(0, 0, -1), z_dir=(0.7298530702233252, -0.6836040490558741, 0)), BOSS_EXTRUDE5_PROFILE_4_DRAFT)


with BuildPart() as part_4:
    add(part_3.part)

    # Boss-Extrude5 profile 4: add boss_extrude5_profile_4_tool
    add(boss_extrude5_profile_4_tool.part)

    # Sketch16 → Cut-Extrude4 (cut)
    with SkipClean():  # the faces are left unmerged after this step: merging them gives an invalid solid
        with BuildSketch(Plane(origin=(-4.289146896, -15.21259915, -44.204164058), x_dir=(0.2444923951386014, 0.90932999306756, -0.3366636785088964), z_dir=(0.0913654641407042, 0.32405189556873676, 0.9416170776598427))):
            with Locations((50.704983573, -59.606984753)):
                Rectangle(SKETCH16_W, SKETCH16_H)
        extrude(amount=-CUT_EXTRUDE4_DEPTH, mode=Mode.SUBTRACT)


solid = Compound([body_2.part, part_4.part])
